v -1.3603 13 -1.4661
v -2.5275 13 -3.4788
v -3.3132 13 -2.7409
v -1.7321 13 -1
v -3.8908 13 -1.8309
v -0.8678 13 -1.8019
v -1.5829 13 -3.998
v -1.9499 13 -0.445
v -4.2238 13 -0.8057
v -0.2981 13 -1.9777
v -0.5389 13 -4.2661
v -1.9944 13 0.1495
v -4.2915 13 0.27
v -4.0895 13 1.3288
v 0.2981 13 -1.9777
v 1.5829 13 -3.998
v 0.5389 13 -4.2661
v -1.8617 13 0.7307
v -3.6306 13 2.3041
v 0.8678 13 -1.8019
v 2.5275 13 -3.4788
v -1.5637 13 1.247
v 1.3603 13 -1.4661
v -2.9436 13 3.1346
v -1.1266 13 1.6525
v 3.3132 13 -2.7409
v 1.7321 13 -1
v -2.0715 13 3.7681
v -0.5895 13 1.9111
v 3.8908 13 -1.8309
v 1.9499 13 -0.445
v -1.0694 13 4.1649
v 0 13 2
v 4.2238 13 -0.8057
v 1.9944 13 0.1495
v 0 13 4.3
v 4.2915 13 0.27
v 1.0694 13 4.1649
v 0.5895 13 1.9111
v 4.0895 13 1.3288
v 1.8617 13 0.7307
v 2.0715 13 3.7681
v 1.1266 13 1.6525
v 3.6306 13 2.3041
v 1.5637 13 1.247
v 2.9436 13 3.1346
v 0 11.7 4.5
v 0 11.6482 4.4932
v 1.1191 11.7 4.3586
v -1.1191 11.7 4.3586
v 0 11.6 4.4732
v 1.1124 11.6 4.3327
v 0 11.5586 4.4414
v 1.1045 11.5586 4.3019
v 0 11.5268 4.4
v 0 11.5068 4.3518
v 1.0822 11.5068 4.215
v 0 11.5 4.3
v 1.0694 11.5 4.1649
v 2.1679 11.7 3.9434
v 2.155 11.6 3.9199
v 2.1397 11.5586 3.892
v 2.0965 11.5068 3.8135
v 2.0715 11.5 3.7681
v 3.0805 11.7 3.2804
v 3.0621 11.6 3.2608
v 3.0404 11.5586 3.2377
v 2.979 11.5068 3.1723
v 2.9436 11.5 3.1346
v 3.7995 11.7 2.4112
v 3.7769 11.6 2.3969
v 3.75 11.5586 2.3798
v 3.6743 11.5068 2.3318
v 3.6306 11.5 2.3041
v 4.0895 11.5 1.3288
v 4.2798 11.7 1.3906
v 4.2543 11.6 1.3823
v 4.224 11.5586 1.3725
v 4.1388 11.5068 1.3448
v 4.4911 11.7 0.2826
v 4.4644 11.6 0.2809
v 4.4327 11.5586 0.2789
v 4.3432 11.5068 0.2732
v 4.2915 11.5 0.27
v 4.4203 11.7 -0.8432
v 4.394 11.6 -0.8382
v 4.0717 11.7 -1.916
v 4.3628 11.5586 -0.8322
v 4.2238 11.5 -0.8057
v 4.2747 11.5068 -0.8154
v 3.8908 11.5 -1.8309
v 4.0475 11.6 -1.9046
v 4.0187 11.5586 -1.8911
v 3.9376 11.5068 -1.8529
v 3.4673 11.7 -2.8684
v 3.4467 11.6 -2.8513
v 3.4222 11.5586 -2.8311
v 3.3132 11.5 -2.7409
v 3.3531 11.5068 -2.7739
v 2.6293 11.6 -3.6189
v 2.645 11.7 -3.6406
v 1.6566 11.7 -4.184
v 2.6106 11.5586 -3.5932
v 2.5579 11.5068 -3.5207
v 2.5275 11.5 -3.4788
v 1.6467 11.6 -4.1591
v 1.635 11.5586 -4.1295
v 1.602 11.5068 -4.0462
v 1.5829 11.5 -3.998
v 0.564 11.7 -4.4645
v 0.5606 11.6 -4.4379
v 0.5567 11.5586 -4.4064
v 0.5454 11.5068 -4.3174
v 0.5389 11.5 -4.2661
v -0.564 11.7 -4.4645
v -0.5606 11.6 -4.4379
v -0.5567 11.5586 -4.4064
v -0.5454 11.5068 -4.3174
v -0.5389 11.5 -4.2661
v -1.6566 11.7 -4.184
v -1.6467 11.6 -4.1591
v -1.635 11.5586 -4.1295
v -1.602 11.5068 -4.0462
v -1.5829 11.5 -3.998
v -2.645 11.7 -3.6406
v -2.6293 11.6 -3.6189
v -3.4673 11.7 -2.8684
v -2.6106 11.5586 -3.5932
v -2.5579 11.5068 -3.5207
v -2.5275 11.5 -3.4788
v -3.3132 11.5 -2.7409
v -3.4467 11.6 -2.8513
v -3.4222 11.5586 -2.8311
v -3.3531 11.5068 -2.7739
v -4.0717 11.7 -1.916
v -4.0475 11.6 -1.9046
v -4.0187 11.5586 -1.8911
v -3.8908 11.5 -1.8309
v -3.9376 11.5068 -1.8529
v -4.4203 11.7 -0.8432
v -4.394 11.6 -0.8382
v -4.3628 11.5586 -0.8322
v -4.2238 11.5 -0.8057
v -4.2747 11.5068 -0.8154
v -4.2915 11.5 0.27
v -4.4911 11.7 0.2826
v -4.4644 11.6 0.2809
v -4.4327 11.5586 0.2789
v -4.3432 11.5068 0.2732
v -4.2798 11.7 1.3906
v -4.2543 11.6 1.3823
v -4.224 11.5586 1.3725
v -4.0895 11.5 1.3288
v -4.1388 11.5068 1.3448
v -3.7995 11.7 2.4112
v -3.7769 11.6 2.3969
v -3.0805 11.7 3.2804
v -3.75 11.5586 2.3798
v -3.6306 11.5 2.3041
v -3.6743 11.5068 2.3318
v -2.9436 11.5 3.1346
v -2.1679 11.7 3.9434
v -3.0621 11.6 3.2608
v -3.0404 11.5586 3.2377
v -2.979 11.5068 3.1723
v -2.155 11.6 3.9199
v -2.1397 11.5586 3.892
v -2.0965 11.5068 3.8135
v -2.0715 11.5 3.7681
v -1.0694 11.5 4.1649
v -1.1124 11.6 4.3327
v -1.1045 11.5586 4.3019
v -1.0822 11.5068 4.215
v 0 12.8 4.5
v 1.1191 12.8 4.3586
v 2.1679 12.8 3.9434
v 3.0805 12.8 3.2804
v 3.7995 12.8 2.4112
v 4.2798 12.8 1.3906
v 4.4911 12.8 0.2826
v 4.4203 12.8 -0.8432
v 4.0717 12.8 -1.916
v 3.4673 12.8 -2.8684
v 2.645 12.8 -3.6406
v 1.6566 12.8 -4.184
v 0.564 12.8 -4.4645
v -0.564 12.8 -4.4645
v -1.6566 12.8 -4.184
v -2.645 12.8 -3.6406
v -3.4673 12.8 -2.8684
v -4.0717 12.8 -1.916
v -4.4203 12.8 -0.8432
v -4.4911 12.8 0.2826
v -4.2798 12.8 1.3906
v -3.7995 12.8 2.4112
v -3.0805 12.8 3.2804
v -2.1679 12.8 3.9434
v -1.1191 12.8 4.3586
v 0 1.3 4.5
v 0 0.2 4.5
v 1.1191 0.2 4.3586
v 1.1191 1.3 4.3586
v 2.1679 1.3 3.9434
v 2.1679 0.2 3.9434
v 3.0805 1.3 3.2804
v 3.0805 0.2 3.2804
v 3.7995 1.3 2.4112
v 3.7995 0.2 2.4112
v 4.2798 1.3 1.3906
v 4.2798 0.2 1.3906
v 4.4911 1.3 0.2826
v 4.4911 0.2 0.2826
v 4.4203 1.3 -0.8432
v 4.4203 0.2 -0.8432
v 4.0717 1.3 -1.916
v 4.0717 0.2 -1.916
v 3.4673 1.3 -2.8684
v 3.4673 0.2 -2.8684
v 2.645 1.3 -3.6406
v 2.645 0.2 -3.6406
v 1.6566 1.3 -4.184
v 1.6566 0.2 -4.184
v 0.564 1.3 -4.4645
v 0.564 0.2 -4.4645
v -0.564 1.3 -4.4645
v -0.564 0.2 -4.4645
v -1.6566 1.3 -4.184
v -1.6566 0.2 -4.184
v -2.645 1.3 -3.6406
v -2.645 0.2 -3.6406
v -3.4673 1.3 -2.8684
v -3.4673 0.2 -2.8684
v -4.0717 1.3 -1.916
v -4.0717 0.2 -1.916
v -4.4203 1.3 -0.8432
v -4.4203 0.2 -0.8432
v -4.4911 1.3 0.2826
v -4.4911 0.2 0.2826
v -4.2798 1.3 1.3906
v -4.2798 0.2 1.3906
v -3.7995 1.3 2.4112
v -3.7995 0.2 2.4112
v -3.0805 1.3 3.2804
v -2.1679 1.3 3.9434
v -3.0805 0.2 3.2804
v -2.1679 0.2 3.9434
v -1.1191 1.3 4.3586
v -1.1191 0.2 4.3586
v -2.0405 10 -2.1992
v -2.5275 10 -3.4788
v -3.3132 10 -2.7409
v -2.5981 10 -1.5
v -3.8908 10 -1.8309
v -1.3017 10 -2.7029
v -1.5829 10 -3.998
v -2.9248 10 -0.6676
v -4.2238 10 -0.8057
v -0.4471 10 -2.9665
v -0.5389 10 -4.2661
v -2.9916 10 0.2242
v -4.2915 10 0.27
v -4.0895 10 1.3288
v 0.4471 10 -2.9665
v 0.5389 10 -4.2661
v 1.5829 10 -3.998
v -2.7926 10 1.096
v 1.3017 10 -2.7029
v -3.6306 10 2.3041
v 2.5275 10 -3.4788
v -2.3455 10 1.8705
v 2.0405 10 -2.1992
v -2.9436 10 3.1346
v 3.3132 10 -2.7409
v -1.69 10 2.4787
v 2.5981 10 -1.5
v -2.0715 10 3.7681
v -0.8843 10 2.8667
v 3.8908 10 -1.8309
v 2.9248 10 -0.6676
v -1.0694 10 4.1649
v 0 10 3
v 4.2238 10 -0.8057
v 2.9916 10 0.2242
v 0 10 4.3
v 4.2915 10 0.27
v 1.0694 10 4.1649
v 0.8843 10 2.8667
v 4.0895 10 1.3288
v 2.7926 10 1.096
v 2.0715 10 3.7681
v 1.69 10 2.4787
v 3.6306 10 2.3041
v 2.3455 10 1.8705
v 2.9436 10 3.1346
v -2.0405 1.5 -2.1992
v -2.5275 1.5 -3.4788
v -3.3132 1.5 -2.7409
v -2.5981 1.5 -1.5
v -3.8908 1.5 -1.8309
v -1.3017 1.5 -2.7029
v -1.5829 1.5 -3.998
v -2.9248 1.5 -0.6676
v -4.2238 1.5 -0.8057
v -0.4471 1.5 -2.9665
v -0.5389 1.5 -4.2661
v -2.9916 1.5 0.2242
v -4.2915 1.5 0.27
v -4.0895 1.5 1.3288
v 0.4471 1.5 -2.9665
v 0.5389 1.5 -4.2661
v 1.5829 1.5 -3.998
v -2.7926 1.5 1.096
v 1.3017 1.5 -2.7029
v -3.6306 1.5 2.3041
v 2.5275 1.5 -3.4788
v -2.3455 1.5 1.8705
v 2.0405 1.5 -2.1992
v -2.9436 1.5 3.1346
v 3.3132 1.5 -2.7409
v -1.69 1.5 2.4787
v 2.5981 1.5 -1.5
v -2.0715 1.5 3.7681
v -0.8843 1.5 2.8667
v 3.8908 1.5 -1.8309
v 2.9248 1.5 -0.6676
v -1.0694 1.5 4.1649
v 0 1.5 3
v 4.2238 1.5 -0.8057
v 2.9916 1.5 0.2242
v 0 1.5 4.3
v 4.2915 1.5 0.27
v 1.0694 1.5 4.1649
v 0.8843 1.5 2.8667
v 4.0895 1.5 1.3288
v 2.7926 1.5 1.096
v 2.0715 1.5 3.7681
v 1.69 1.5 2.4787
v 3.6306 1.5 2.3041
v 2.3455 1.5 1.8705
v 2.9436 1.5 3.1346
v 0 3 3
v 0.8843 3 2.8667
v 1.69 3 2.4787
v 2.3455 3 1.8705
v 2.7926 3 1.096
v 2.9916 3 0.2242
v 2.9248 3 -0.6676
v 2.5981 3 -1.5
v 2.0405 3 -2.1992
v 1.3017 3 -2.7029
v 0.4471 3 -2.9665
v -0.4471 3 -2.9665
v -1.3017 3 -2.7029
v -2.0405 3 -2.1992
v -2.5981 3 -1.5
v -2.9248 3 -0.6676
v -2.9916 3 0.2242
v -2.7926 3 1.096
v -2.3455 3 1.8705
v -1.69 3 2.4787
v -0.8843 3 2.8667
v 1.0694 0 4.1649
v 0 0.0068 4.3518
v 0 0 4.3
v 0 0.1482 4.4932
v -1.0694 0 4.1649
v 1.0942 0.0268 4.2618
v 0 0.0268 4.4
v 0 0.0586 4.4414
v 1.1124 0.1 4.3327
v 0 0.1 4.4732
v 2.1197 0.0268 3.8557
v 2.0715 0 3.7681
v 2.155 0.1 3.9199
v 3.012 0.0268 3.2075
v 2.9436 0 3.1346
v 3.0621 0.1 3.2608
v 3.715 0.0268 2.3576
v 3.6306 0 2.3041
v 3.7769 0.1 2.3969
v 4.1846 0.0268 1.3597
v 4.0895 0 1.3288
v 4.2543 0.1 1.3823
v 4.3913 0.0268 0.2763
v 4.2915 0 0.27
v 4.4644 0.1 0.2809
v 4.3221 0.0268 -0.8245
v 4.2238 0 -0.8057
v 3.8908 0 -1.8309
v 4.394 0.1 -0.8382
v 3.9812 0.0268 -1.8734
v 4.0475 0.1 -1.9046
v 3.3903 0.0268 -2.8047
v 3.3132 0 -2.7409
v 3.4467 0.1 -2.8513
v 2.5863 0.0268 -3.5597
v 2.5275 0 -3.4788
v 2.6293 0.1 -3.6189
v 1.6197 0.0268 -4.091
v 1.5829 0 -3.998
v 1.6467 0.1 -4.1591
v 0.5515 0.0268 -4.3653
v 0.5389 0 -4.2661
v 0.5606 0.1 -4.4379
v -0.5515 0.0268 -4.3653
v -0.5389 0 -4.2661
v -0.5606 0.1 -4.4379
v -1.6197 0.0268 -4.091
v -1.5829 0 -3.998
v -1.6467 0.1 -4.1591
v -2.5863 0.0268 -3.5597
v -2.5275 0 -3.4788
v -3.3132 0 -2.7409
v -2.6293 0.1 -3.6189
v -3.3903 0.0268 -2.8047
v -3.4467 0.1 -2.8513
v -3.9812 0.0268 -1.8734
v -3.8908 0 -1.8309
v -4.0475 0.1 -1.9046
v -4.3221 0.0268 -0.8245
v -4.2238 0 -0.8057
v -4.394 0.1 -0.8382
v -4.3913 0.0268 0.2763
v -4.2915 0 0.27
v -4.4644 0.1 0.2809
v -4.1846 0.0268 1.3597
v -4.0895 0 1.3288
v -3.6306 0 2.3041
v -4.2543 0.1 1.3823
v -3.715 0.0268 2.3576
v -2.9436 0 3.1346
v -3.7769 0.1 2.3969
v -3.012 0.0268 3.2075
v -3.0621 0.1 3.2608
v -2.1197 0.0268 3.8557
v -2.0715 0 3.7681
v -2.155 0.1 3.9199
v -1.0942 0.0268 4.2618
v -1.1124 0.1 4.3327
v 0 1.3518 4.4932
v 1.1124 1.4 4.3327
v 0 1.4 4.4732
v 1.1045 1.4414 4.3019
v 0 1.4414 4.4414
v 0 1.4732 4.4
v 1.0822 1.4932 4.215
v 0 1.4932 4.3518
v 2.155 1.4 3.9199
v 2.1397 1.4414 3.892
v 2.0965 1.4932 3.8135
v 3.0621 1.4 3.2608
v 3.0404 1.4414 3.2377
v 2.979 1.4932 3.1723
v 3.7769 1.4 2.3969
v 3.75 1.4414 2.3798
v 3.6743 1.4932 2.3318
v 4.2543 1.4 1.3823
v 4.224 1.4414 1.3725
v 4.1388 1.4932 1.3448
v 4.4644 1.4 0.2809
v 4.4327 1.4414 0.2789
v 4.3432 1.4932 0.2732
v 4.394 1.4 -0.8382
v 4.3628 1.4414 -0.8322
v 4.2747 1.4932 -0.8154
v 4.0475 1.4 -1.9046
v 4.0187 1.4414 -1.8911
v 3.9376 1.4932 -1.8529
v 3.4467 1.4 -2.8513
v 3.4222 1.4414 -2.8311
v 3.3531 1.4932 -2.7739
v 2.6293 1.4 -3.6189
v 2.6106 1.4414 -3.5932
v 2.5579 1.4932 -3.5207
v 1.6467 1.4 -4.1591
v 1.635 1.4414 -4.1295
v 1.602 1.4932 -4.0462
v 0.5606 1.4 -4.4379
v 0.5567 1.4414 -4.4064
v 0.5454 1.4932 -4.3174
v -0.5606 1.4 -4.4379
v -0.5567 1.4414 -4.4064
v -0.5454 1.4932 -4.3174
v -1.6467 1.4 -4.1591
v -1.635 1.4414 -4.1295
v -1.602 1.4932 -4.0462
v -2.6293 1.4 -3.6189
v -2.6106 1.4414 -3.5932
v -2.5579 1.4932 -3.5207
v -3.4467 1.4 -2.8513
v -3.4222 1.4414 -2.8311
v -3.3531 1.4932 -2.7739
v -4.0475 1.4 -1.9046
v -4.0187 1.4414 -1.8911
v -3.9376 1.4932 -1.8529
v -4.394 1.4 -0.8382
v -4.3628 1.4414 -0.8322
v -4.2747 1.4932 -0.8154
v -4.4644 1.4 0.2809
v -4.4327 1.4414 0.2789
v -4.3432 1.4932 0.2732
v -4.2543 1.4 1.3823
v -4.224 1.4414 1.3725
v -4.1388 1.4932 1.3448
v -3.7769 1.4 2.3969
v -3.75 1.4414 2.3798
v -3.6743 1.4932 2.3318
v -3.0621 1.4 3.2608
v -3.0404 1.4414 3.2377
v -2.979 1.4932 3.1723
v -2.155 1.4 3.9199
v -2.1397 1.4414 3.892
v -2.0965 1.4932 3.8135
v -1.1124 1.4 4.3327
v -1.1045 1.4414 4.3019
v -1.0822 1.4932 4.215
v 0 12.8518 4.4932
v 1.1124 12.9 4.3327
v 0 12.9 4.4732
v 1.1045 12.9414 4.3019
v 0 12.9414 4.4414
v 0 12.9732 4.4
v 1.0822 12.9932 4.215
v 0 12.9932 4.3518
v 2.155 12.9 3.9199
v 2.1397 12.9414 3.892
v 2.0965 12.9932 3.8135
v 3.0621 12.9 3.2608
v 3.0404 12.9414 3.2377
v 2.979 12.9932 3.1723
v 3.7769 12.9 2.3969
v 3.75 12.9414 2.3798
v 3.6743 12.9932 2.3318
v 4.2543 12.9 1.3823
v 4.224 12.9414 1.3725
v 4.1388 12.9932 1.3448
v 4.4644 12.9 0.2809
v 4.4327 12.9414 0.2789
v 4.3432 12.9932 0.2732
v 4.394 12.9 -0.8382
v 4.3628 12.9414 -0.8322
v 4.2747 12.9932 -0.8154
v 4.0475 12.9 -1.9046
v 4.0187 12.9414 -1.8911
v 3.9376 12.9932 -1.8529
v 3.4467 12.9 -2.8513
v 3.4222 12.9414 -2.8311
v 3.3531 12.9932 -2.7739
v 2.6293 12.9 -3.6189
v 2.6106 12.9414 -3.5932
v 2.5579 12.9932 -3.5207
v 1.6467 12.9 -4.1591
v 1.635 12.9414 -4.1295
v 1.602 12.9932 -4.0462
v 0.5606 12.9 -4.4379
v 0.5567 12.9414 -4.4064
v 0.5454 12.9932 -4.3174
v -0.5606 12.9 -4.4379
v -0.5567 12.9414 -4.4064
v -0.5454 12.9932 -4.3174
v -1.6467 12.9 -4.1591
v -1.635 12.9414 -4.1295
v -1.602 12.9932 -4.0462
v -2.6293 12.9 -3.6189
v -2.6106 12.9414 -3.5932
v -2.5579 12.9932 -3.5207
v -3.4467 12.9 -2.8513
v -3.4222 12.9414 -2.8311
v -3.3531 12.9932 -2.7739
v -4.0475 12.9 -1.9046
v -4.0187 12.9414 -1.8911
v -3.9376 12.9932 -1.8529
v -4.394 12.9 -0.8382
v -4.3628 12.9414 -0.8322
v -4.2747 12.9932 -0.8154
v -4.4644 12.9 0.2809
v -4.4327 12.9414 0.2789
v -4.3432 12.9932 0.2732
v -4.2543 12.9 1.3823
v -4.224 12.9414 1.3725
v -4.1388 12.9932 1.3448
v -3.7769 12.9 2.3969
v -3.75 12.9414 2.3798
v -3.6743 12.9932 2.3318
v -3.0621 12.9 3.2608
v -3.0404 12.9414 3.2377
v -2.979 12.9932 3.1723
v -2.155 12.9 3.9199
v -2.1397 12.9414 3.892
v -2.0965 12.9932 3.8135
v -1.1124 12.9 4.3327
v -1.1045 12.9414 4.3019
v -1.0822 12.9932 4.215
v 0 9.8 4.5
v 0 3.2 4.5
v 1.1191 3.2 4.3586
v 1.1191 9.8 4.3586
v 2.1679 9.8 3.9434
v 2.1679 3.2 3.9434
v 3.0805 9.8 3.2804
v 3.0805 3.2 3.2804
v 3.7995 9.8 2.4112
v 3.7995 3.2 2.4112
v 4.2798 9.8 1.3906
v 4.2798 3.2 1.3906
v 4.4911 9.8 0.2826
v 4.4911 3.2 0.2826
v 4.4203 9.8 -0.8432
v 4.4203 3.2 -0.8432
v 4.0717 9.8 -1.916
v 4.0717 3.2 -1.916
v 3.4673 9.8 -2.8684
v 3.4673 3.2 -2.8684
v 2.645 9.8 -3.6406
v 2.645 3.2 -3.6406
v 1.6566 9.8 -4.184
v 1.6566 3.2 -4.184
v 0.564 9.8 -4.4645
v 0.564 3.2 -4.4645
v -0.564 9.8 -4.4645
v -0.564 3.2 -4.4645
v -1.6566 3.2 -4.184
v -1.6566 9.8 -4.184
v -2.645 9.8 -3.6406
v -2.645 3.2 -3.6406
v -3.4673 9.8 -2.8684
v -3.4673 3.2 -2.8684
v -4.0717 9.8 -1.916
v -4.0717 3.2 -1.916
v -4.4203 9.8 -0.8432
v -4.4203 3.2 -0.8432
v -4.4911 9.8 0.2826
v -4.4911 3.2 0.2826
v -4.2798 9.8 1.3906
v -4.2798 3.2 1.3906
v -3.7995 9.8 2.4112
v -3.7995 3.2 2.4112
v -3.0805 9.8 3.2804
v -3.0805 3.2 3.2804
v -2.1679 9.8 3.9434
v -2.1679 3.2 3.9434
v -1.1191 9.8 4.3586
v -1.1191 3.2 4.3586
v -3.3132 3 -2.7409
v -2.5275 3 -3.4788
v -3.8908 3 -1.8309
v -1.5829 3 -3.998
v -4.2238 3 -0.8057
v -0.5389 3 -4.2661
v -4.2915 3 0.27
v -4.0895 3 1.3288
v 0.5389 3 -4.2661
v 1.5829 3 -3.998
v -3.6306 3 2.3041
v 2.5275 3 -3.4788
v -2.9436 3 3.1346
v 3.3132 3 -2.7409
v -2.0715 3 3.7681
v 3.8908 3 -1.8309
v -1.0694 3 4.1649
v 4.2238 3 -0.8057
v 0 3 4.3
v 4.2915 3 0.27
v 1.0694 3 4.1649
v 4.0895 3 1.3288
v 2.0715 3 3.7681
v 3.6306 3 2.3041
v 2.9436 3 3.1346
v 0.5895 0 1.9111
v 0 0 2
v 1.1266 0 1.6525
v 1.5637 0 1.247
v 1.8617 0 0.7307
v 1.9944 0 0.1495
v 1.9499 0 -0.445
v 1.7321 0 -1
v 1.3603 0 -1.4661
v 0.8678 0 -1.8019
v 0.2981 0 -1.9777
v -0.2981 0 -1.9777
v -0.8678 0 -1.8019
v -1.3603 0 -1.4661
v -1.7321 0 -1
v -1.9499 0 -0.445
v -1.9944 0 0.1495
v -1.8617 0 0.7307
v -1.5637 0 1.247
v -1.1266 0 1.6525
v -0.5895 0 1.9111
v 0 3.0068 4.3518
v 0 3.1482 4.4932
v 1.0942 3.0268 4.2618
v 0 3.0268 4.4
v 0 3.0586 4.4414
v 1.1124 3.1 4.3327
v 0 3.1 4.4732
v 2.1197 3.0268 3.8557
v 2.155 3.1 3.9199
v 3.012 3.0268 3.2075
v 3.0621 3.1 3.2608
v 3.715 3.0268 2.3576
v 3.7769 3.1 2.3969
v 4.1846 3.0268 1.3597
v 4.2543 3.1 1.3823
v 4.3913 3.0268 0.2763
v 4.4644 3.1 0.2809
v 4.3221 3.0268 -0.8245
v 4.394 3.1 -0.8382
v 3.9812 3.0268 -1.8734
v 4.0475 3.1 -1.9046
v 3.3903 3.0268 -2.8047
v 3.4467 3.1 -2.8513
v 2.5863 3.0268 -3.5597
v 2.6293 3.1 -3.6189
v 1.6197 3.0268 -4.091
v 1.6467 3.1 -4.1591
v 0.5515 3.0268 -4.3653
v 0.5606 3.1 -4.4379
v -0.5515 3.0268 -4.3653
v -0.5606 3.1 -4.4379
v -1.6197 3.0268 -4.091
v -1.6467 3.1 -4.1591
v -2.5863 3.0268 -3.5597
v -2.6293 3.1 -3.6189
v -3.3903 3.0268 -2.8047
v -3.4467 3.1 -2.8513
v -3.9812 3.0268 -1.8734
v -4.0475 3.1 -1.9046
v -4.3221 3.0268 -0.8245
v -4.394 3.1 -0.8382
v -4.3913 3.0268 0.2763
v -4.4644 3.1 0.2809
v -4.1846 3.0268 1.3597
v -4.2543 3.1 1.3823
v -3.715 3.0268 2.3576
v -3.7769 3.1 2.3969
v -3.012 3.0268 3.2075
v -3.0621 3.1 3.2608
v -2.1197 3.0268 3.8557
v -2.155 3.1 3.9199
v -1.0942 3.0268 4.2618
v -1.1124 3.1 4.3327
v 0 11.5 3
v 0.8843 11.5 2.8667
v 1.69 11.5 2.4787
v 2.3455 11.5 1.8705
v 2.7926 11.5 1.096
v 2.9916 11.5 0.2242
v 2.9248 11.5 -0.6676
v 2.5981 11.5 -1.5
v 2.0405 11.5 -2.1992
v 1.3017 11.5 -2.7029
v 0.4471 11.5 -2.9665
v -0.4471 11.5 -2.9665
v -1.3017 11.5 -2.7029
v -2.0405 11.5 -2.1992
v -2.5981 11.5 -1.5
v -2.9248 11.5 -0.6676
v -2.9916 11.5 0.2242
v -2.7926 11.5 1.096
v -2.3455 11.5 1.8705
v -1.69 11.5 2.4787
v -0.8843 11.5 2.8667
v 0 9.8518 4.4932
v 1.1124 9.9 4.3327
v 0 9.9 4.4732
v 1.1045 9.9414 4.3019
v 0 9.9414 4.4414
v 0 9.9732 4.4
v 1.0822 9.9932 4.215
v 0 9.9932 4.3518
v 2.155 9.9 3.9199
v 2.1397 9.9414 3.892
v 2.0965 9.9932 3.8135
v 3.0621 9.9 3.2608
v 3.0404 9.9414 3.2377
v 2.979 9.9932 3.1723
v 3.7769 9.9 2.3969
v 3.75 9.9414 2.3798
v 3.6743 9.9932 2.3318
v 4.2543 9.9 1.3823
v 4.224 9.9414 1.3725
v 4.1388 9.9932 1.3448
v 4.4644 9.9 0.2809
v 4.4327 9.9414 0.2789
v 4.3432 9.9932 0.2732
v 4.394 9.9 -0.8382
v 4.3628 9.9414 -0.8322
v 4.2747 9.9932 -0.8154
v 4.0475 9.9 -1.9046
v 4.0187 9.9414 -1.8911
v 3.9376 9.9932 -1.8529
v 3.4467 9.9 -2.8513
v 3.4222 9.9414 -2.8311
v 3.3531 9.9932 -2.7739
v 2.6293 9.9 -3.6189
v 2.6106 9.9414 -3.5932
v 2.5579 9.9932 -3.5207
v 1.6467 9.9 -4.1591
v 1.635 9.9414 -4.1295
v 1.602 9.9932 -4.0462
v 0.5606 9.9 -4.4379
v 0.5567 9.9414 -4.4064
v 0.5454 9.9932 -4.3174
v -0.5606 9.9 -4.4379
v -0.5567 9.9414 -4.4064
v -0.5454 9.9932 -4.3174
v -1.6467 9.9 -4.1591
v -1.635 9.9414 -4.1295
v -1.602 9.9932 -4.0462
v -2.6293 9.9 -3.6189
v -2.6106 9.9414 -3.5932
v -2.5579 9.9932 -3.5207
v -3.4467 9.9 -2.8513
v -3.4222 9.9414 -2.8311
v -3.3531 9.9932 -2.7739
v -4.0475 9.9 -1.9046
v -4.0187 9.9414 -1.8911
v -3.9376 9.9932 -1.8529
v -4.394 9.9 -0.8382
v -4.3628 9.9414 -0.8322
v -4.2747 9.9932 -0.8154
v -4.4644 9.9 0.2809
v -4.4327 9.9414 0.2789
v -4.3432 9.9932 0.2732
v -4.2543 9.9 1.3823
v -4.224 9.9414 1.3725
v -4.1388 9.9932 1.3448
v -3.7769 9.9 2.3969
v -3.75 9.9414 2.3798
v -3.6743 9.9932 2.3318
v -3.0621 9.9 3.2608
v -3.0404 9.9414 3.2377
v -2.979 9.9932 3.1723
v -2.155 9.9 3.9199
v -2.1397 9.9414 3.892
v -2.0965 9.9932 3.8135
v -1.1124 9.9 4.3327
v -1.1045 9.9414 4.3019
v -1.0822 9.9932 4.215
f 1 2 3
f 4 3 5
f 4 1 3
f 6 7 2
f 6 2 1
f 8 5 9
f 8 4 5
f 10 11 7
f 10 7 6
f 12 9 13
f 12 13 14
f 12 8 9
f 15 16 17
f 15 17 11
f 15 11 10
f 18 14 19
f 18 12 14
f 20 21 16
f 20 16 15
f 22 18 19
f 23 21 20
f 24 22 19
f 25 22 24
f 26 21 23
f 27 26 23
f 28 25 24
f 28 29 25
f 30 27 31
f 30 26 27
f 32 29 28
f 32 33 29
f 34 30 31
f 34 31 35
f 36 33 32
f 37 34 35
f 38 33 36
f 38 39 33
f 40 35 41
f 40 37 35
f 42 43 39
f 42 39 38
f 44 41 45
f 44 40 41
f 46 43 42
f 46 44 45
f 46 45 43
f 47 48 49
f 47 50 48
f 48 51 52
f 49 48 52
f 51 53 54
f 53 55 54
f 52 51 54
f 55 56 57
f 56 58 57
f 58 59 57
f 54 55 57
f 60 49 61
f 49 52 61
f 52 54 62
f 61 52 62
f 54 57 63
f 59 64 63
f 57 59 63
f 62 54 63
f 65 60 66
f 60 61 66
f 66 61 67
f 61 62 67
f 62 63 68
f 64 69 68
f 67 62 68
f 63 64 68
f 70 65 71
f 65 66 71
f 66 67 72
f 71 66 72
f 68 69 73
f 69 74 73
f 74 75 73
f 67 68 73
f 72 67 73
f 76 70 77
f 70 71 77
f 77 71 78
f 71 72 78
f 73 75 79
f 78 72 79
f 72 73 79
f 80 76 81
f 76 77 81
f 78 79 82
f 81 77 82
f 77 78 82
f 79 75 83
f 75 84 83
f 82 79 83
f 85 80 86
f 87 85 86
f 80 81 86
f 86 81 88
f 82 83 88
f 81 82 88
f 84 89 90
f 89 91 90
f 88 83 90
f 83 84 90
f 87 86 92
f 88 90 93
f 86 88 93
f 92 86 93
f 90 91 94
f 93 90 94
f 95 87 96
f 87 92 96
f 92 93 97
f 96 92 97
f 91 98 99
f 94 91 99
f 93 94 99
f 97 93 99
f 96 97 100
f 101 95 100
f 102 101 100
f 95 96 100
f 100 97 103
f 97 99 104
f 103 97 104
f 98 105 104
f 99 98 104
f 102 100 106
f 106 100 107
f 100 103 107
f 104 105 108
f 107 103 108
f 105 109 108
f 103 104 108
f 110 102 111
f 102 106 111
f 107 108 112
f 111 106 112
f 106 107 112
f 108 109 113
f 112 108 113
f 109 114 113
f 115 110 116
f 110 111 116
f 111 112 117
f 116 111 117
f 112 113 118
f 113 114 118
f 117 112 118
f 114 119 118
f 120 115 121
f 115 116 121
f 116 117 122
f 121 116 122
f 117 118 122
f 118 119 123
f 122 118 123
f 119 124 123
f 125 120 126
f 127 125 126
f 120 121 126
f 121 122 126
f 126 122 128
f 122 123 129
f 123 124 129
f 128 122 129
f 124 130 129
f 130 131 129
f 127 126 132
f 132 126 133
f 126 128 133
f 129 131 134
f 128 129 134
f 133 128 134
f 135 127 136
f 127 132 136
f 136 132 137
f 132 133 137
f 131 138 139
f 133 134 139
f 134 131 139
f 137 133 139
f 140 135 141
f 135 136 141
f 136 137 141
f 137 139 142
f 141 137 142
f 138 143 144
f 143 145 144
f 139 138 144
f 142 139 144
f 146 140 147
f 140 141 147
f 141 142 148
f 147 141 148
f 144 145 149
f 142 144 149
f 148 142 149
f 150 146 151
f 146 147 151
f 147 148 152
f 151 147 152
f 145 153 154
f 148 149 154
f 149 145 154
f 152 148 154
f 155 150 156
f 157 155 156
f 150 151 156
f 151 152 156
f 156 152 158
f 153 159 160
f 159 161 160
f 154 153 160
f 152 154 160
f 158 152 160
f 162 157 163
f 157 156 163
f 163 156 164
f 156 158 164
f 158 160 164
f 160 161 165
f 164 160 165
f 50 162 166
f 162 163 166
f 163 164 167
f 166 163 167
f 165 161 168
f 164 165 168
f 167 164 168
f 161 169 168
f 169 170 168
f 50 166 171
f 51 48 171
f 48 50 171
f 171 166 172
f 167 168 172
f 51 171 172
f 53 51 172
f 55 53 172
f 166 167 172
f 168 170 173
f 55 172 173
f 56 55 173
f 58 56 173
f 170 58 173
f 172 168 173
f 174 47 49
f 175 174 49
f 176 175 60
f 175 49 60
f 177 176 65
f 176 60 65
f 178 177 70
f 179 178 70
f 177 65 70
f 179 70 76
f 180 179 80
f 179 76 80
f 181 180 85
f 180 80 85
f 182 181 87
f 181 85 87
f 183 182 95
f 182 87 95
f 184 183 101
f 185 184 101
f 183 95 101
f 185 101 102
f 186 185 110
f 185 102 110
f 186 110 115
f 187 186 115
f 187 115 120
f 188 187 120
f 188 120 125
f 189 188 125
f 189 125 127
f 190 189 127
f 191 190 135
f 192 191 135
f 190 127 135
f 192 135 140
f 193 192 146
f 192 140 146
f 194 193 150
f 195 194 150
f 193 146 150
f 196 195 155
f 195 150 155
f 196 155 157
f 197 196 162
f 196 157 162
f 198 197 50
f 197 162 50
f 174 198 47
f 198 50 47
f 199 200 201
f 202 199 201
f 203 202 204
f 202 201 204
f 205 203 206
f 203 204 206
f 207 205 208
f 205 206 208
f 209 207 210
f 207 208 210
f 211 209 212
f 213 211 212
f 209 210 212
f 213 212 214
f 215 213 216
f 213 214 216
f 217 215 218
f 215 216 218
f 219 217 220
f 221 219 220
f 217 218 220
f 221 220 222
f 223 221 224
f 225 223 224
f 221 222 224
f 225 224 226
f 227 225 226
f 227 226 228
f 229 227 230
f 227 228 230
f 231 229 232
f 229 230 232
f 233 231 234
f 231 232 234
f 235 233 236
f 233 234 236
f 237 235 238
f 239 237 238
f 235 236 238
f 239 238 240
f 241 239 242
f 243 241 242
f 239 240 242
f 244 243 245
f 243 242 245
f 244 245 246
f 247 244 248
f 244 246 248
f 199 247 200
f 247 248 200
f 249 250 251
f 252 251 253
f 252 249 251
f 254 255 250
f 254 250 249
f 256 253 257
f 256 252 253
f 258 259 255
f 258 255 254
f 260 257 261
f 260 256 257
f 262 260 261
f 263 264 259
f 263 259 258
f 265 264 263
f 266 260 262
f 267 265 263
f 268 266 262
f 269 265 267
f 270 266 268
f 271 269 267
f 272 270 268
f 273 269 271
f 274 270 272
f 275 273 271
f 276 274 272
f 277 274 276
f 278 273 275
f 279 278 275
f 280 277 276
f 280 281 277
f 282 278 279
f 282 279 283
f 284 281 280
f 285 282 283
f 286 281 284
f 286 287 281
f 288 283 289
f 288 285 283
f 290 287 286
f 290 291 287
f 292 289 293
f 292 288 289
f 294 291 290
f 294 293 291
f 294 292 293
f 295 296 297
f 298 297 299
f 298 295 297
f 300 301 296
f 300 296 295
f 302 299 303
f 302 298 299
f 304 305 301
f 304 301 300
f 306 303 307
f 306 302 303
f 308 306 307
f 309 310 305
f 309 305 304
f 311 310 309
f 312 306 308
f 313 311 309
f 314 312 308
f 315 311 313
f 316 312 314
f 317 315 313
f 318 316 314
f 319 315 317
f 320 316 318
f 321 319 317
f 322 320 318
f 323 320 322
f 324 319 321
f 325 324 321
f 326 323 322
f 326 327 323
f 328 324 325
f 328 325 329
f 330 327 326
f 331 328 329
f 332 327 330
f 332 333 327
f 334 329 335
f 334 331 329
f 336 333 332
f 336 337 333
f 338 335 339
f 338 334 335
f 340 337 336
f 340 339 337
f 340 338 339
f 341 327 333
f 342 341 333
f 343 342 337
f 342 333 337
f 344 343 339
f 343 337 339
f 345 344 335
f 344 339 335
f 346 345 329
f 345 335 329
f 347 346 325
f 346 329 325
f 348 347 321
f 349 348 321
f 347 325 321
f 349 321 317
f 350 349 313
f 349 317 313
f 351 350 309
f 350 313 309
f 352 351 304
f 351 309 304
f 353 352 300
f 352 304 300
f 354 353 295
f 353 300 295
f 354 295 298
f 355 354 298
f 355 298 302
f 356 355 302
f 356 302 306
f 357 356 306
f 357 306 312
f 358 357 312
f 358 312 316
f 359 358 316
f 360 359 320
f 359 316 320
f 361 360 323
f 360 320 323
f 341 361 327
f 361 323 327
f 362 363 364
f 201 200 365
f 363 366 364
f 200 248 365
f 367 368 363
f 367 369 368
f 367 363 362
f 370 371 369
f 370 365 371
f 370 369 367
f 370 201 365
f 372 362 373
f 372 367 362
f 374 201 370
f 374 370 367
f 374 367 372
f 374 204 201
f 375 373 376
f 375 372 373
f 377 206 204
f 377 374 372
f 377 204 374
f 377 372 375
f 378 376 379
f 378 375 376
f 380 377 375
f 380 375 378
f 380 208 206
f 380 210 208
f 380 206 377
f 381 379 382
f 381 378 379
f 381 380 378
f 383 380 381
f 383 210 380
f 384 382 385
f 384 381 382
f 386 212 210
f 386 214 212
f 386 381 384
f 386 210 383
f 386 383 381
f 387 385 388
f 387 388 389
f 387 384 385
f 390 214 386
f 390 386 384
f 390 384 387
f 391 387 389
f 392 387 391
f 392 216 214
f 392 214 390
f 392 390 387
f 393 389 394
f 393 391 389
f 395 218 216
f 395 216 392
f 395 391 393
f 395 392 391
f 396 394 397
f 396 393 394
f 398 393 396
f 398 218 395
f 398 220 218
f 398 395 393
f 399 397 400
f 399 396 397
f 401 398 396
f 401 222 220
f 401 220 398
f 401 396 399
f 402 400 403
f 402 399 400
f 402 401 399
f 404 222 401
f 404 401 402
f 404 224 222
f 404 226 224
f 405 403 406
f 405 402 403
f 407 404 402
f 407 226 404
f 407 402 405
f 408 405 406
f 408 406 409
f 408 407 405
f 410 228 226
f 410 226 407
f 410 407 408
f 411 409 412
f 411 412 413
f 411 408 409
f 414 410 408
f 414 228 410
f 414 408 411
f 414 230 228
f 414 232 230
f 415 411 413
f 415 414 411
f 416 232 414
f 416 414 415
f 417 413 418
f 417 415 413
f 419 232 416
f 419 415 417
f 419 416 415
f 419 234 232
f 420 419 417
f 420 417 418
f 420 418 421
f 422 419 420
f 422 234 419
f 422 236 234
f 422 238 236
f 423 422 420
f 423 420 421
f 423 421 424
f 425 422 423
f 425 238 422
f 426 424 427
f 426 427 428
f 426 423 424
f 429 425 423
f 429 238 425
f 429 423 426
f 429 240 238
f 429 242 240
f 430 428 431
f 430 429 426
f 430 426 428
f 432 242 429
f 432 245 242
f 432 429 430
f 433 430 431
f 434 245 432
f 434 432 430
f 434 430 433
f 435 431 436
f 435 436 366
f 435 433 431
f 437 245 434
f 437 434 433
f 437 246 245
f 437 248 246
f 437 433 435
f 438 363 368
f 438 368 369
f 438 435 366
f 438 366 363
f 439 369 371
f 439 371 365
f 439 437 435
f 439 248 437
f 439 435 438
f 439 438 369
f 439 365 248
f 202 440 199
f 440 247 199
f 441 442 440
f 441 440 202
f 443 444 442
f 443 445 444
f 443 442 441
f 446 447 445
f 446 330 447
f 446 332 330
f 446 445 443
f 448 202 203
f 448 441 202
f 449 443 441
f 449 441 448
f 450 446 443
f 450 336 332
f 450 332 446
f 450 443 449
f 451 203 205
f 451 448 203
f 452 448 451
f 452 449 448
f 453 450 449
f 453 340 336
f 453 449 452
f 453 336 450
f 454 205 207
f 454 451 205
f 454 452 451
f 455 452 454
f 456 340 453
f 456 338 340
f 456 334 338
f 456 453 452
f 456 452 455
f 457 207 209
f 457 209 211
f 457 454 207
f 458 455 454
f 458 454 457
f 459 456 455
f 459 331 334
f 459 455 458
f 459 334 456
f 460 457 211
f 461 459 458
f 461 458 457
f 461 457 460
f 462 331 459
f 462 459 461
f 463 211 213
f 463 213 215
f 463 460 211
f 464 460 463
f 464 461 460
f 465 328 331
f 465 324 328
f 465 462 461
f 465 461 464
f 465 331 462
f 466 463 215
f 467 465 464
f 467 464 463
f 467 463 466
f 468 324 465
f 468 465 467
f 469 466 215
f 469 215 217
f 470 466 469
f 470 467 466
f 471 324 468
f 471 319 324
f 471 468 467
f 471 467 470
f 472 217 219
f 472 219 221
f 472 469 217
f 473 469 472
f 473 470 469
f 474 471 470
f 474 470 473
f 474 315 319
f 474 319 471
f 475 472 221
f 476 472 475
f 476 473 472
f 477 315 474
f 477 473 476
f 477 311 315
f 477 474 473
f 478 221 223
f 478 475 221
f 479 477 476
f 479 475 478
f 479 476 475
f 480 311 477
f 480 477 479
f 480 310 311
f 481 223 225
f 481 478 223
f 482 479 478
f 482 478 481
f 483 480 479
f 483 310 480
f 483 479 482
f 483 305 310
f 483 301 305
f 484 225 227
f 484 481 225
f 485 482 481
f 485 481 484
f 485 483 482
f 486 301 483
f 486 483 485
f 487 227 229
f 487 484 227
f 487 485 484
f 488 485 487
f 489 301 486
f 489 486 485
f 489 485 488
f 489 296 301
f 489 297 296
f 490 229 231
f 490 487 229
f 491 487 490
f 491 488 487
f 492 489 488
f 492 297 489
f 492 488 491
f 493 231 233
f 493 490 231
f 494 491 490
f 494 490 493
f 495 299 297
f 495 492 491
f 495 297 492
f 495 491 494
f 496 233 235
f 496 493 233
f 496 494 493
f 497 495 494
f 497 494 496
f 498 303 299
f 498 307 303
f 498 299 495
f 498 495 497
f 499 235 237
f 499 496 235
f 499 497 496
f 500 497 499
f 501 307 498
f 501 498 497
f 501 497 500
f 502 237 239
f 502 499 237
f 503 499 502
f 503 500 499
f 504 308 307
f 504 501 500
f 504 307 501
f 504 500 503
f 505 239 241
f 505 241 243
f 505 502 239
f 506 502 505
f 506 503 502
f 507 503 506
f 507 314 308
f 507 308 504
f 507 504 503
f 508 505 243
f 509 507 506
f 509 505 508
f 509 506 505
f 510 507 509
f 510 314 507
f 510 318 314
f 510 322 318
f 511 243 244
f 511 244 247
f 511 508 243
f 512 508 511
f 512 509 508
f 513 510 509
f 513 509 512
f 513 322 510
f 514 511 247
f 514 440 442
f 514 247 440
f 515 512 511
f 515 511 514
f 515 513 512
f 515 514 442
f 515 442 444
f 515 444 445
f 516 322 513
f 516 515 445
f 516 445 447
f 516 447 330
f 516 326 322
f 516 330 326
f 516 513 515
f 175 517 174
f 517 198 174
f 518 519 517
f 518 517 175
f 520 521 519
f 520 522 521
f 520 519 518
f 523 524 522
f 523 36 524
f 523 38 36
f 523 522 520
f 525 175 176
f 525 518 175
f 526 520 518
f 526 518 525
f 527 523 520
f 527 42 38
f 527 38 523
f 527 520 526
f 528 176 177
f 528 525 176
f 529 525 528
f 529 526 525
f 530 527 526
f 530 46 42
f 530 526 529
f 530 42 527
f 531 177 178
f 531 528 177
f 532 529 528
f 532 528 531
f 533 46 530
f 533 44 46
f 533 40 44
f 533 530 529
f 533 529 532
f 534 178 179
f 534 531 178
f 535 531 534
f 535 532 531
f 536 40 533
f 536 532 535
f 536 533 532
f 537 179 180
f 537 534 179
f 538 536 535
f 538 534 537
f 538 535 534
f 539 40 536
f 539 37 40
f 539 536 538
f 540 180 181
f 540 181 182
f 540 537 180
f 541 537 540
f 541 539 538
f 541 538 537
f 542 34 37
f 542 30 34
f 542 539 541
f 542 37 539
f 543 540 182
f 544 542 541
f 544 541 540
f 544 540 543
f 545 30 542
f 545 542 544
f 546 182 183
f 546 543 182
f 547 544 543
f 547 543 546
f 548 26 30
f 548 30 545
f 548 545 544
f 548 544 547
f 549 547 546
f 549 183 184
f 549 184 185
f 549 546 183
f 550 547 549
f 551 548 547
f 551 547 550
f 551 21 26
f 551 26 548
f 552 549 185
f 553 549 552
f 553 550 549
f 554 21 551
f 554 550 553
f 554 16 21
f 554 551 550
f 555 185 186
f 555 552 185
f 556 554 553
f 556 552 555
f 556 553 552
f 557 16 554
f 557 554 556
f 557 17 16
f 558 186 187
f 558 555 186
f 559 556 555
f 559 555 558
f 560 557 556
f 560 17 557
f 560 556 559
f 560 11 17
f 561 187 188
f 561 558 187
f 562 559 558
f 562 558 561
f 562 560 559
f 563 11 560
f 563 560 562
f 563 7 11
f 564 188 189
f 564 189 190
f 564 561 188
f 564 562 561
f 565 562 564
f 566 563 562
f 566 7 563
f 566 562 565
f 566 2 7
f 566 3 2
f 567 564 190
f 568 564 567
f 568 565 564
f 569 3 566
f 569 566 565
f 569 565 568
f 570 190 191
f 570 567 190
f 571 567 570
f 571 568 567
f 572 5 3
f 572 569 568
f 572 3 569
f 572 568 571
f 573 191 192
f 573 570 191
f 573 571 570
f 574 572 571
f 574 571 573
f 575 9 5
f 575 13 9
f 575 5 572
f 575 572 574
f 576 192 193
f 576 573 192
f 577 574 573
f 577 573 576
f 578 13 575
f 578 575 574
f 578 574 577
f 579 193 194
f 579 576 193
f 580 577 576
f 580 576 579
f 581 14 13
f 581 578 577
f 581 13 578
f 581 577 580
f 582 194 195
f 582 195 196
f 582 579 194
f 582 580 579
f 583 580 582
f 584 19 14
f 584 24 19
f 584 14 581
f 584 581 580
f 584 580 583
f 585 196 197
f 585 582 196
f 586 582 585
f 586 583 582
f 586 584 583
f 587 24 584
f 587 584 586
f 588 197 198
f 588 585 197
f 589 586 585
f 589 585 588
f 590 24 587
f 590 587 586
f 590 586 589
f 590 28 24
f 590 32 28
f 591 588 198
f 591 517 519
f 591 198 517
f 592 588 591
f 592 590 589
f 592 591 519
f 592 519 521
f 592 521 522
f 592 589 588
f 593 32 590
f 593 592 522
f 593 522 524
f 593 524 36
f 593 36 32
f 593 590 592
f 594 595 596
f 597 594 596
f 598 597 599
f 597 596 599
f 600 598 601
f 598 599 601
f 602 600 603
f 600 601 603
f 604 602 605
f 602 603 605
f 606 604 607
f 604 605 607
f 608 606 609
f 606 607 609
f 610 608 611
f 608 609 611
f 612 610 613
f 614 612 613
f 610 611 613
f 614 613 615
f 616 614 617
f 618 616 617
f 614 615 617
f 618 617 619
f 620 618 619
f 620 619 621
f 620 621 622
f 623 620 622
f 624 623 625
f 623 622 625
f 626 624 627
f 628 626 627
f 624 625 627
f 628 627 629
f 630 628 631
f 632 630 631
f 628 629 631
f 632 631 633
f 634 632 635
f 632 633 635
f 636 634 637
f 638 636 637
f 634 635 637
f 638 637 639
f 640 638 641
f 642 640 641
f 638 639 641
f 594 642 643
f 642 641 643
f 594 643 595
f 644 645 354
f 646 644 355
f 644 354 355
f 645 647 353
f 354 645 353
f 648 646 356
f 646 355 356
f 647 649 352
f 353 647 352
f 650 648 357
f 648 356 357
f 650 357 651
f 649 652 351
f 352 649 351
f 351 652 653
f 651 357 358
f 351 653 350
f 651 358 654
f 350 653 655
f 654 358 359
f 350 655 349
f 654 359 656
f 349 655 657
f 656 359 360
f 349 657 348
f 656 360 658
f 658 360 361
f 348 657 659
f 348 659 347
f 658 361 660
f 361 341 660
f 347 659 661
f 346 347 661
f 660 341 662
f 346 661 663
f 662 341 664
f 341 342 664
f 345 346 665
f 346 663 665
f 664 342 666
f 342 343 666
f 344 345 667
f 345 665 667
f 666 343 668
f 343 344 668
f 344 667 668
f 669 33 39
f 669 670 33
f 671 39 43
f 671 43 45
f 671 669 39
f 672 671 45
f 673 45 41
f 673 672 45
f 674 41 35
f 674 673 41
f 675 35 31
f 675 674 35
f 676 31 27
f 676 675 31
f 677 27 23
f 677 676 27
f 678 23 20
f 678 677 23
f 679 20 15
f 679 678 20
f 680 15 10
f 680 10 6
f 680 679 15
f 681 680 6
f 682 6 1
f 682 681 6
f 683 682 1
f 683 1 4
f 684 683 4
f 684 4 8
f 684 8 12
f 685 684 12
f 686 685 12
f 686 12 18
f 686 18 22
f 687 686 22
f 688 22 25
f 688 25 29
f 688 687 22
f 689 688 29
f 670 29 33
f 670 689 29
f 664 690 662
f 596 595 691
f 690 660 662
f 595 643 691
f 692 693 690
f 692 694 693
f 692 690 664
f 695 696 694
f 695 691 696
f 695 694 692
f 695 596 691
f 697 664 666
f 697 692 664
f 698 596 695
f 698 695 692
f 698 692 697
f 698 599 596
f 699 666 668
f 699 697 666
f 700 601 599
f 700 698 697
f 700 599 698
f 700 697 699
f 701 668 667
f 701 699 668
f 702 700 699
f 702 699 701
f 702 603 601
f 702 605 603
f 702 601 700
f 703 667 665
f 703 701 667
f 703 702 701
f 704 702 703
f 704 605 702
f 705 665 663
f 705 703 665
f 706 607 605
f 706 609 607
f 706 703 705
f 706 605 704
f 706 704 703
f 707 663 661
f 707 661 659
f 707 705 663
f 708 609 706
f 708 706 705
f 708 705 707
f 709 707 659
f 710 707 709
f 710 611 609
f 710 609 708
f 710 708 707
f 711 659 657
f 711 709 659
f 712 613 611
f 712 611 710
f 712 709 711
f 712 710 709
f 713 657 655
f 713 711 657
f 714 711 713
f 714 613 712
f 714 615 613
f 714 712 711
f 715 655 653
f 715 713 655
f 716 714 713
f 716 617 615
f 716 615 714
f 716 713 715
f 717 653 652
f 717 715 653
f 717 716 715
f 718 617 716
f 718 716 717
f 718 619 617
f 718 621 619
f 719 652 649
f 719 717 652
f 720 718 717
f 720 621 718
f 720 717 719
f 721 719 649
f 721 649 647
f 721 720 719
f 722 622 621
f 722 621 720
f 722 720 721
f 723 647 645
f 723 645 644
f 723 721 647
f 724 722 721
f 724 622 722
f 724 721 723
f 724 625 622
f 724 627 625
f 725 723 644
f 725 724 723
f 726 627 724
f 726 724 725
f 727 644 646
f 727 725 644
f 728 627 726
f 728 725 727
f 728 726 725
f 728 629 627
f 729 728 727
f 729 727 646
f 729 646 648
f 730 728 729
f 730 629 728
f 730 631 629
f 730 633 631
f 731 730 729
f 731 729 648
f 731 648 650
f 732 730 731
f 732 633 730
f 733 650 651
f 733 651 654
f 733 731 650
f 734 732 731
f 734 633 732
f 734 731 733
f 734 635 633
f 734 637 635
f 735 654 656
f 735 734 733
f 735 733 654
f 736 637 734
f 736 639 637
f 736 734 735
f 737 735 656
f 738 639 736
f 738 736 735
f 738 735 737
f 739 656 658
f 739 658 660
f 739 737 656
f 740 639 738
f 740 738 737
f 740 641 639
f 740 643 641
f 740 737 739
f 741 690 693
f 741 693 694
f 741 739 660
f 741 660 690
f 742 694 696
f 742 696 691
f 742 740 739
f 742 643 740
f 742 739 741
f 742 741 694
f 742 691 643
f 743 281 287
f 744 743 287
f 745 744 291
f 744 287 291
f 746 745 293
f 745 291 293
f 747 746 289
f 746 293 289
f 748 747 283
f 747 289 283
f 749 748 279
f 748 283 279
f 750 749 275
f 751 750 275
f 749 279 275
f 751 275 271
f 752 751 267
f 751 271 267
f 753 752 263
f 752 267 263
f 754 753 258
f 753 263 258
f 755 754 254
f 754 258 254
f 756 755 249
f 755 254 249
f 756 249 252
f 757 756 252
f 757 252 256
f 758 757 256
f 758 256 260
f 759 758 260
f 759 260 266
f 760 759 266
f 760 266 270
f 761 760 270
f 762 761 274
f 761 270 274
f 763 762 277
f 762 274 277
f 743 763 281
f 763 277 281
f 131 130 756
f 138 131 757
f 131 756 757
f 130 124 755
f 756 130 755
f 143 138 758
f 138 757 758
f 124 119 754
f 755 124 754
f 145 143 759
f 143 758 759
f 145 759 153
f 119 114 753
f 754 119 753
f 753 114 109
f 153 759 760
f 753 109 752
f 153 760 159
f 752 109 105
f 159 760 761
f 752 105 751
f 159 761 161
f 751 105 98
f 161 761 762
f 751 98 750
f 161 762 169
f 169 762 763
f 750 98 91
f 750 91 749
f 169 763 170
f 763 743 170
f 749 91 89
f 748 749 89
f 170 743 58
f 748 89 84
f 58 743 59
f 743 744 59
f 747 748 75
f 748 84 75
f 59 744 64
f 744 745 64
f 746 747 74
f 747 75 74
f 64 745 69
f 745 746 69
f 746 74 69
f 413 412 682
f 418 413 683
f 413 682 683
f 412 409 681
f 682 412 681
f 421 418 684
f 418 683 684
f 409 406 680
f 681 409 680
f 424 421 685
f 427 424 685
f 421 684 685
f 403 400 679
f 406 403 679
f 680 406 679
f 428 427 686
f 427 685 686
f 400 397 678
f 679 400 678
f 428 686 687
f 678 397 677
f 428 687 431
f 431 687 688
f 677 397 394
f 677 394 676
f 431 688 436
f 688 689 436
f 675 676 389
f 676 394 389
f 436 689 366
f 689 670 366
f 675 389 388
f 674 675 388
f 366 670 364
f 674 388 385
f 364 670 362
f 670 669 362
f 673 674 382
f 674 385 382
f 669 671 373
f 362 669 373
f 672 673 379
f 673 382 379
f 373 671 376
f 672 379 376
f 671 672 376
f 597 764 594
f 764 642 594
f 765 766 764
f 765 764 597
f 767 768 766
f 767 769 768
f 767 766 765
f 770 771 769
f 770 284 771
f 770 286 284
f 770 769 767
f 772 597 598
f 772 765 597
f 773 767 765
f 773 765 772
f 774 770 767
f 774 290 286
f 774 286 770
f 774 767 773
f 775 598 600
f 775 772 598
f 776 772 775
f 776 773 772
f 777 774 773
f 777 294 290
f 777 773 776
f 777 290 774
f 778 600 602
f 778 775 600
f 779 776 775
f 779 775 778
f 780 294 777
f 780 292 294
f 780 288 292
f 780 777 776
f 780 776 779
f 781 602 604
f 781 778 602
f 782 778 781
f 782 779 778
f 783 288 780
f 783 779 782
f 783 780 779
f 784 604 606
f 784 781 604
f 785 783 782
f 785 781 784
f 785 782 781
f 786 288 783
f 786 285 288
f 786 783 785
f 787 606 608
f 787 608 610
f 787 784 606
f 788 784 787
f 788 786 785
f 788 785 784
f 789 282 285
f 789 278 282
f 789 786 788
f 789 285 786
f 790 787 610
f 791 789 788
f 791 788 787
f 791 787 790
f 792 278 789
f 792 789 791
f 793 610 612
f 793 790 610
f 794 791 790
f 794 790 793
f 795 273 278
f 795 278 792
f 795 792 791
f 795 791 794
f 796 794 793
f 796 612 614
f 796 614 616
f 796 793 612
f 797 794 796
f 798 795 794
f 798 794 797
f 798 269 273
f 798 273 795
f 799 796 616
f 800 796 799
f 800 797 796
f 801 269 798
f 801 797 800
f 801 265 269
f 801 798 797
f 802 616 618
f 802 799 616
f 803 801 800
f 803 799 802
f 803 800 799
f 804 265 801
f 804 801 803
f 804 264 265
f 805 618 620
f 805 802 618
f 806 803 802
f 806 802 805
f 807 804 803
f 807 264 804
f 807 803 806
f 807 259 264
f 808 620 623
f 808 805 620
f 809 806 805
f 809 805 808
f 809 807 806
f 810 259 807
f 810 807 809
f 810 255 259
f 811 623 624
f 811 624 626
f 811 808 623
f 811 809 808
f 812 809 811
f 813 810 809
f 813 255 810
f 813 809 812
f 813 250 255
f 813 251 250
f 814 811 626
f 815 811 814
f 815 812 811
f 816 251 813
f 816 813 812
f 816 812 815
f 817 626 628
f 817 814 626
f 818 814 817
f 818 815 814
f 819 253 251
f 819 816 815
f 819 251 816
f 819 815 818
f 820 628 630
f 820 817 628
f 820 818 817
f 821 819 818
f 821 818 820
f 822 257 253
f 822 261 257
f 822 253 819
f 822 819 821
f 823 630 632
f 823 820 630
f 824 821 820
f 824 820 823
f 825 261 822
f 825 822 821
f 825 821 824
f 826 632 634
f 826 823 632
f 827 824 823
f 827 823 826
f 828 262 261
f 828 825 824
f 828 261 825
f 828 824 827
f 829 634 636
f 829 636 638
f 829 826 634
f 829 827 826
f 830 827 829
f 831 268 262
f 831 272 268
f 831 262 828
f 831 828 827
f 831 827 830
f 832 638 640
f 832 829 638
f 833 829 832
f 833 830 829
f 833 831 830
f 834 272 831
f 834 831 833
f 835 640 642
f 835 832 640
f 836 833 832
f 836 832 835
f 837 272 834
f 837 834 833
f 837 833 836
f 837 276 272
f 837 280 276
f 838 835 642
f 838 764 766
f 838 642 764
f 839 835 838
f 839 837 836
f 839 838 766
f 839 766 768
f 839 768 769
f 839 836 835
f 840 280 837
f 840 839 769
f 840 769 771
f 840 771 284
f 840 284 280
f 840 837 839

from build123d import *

# Parameters (mm, degrees)
SKETCH1_R           = 4.5
SKETCH1_R_2         = 2
BOSS_EXTRUDE1_DEPTH = 1.5
SKETCH2_R           = 3
SKETCH2_R_2         = 2
BOSS_EXTRUDE2_DEPTH = 1.5
SKETCH3_R           = 4.5
SKETCH3_R_2         = 2
BOSS_EXTRUDE3_DEPTH = 7
SKETCH4_R           = 3
SKETCH4_R_2         = 2
BOSS_EXTRUDE4_DEPTH = 1.5
SKETCH5_R           = 4.5
SKETCH5_R_2         = 2
BOSS_EXTRUDE5_DEPTH = 1.5
FILLET1_R           = 0.2


with BuildPart() as part:
    # Sketch1 → Boss-Extrude1 (new body)
    with BuildSketch(Plane(origin=(0, 0, 0), x_dir=(1, 0, 0), z_dir=(0, 1, 0))):
        with Locations(Location((0, 0, 0), (0, 0, 270))):
            Circle(SKETCH1_R)
        with Locations(Location((0, 0, 0), (0, 0, 270))):
            Circle(SKETCH1_R_2, mode=Mode.SUBTRACT)
    extrude(amount=BOSS_EXTRUDE1_DEPTH)

    # Sketch2 → Boss-Extrude2 (add)
    with BuildSketch(Plane(origin=(0, 1.5, 0), x_dir=(1, 0, 0), z_dir=(0, 1, 0))):
        with Locations(Location((0, 0, 0), (0, 0, 270))):
            Circle(SKETCH2_R)
        with Locations(Location((0, 0, 0), (0, 0, 270))):
            Circle(SKETCH2_R_2, mode=Mode.SUBTRACT)
    extrude(amount=BOSS_EXTRUDE2_DEPTH)

    # Sketch3 → Boss-Extrude3 (add)
    with BuildSketch(Plane(origin=(0, 3, 0), x_dir=(1, 0, 0), z_dir=(0, 1, 0))):
        with Locations(Location((0, 0, 0), (0, 0, 270))):
            Circle(SKETCH3_R)
        with Locations(Location((0, 0, 0), (0, 0, 270))):
            Circle(SKETCH3_R_2, mode=Mode.SUBTRACT)
    extrude(amount=BOSS_EXTRUDE3_DEPTH)

    # Sketch4 → Boss-Extrude4 (add)
    with BuildSketch(Plane(origin=(0, 10, 0), x_dir=(1, 0, 0), z_dir=(0, 1, 0))):
        with Locations(Location((0, 0, 0), (0, 0, 270))):
            Circle(SKETCH4_R)
        with Locations(Location((0, 0, 0), (0, 0, 270))):
            Circle(SKETCH4_R_2, mode=Mode.SUBTRACT)
    extrude(amount=BOSS_EXTRUDE4_DEPTH)

    # Sketch5 → Boss-Extrude5 (add)
    with BuildSketch(Plane(origin=(0, 11.5, 0), x_dir=(1, 0, 0), z_dir=(0, 1, 0))):
        with Locations(Location((0, 0, 0), (0, 0, 270))):
            Circle(SKETCH5_R)
        with Locations(Location((0, 0, 0), (0, 0, 270))):
            Circle(SKETCH5_R_2, mode=Mode.SUBTRACT)
    extrude(amount=BOSS_EXTRUDE5_DEPTH)

    # Fillet1
    fillet1_edges = [part.edges().sort_by_distance(p)[0] for p in [
        (0, 10, -4.5),
        (0, 3, -4.5),
        (0, 0, -4.5),
        (0, 13, -4.5),
        (0, 11.5, -4.5),
        (0, 1.5, -4.5),
    ]]
    fillet(fillet1_edges, radius=FILLET1_R)


solid = part.part
